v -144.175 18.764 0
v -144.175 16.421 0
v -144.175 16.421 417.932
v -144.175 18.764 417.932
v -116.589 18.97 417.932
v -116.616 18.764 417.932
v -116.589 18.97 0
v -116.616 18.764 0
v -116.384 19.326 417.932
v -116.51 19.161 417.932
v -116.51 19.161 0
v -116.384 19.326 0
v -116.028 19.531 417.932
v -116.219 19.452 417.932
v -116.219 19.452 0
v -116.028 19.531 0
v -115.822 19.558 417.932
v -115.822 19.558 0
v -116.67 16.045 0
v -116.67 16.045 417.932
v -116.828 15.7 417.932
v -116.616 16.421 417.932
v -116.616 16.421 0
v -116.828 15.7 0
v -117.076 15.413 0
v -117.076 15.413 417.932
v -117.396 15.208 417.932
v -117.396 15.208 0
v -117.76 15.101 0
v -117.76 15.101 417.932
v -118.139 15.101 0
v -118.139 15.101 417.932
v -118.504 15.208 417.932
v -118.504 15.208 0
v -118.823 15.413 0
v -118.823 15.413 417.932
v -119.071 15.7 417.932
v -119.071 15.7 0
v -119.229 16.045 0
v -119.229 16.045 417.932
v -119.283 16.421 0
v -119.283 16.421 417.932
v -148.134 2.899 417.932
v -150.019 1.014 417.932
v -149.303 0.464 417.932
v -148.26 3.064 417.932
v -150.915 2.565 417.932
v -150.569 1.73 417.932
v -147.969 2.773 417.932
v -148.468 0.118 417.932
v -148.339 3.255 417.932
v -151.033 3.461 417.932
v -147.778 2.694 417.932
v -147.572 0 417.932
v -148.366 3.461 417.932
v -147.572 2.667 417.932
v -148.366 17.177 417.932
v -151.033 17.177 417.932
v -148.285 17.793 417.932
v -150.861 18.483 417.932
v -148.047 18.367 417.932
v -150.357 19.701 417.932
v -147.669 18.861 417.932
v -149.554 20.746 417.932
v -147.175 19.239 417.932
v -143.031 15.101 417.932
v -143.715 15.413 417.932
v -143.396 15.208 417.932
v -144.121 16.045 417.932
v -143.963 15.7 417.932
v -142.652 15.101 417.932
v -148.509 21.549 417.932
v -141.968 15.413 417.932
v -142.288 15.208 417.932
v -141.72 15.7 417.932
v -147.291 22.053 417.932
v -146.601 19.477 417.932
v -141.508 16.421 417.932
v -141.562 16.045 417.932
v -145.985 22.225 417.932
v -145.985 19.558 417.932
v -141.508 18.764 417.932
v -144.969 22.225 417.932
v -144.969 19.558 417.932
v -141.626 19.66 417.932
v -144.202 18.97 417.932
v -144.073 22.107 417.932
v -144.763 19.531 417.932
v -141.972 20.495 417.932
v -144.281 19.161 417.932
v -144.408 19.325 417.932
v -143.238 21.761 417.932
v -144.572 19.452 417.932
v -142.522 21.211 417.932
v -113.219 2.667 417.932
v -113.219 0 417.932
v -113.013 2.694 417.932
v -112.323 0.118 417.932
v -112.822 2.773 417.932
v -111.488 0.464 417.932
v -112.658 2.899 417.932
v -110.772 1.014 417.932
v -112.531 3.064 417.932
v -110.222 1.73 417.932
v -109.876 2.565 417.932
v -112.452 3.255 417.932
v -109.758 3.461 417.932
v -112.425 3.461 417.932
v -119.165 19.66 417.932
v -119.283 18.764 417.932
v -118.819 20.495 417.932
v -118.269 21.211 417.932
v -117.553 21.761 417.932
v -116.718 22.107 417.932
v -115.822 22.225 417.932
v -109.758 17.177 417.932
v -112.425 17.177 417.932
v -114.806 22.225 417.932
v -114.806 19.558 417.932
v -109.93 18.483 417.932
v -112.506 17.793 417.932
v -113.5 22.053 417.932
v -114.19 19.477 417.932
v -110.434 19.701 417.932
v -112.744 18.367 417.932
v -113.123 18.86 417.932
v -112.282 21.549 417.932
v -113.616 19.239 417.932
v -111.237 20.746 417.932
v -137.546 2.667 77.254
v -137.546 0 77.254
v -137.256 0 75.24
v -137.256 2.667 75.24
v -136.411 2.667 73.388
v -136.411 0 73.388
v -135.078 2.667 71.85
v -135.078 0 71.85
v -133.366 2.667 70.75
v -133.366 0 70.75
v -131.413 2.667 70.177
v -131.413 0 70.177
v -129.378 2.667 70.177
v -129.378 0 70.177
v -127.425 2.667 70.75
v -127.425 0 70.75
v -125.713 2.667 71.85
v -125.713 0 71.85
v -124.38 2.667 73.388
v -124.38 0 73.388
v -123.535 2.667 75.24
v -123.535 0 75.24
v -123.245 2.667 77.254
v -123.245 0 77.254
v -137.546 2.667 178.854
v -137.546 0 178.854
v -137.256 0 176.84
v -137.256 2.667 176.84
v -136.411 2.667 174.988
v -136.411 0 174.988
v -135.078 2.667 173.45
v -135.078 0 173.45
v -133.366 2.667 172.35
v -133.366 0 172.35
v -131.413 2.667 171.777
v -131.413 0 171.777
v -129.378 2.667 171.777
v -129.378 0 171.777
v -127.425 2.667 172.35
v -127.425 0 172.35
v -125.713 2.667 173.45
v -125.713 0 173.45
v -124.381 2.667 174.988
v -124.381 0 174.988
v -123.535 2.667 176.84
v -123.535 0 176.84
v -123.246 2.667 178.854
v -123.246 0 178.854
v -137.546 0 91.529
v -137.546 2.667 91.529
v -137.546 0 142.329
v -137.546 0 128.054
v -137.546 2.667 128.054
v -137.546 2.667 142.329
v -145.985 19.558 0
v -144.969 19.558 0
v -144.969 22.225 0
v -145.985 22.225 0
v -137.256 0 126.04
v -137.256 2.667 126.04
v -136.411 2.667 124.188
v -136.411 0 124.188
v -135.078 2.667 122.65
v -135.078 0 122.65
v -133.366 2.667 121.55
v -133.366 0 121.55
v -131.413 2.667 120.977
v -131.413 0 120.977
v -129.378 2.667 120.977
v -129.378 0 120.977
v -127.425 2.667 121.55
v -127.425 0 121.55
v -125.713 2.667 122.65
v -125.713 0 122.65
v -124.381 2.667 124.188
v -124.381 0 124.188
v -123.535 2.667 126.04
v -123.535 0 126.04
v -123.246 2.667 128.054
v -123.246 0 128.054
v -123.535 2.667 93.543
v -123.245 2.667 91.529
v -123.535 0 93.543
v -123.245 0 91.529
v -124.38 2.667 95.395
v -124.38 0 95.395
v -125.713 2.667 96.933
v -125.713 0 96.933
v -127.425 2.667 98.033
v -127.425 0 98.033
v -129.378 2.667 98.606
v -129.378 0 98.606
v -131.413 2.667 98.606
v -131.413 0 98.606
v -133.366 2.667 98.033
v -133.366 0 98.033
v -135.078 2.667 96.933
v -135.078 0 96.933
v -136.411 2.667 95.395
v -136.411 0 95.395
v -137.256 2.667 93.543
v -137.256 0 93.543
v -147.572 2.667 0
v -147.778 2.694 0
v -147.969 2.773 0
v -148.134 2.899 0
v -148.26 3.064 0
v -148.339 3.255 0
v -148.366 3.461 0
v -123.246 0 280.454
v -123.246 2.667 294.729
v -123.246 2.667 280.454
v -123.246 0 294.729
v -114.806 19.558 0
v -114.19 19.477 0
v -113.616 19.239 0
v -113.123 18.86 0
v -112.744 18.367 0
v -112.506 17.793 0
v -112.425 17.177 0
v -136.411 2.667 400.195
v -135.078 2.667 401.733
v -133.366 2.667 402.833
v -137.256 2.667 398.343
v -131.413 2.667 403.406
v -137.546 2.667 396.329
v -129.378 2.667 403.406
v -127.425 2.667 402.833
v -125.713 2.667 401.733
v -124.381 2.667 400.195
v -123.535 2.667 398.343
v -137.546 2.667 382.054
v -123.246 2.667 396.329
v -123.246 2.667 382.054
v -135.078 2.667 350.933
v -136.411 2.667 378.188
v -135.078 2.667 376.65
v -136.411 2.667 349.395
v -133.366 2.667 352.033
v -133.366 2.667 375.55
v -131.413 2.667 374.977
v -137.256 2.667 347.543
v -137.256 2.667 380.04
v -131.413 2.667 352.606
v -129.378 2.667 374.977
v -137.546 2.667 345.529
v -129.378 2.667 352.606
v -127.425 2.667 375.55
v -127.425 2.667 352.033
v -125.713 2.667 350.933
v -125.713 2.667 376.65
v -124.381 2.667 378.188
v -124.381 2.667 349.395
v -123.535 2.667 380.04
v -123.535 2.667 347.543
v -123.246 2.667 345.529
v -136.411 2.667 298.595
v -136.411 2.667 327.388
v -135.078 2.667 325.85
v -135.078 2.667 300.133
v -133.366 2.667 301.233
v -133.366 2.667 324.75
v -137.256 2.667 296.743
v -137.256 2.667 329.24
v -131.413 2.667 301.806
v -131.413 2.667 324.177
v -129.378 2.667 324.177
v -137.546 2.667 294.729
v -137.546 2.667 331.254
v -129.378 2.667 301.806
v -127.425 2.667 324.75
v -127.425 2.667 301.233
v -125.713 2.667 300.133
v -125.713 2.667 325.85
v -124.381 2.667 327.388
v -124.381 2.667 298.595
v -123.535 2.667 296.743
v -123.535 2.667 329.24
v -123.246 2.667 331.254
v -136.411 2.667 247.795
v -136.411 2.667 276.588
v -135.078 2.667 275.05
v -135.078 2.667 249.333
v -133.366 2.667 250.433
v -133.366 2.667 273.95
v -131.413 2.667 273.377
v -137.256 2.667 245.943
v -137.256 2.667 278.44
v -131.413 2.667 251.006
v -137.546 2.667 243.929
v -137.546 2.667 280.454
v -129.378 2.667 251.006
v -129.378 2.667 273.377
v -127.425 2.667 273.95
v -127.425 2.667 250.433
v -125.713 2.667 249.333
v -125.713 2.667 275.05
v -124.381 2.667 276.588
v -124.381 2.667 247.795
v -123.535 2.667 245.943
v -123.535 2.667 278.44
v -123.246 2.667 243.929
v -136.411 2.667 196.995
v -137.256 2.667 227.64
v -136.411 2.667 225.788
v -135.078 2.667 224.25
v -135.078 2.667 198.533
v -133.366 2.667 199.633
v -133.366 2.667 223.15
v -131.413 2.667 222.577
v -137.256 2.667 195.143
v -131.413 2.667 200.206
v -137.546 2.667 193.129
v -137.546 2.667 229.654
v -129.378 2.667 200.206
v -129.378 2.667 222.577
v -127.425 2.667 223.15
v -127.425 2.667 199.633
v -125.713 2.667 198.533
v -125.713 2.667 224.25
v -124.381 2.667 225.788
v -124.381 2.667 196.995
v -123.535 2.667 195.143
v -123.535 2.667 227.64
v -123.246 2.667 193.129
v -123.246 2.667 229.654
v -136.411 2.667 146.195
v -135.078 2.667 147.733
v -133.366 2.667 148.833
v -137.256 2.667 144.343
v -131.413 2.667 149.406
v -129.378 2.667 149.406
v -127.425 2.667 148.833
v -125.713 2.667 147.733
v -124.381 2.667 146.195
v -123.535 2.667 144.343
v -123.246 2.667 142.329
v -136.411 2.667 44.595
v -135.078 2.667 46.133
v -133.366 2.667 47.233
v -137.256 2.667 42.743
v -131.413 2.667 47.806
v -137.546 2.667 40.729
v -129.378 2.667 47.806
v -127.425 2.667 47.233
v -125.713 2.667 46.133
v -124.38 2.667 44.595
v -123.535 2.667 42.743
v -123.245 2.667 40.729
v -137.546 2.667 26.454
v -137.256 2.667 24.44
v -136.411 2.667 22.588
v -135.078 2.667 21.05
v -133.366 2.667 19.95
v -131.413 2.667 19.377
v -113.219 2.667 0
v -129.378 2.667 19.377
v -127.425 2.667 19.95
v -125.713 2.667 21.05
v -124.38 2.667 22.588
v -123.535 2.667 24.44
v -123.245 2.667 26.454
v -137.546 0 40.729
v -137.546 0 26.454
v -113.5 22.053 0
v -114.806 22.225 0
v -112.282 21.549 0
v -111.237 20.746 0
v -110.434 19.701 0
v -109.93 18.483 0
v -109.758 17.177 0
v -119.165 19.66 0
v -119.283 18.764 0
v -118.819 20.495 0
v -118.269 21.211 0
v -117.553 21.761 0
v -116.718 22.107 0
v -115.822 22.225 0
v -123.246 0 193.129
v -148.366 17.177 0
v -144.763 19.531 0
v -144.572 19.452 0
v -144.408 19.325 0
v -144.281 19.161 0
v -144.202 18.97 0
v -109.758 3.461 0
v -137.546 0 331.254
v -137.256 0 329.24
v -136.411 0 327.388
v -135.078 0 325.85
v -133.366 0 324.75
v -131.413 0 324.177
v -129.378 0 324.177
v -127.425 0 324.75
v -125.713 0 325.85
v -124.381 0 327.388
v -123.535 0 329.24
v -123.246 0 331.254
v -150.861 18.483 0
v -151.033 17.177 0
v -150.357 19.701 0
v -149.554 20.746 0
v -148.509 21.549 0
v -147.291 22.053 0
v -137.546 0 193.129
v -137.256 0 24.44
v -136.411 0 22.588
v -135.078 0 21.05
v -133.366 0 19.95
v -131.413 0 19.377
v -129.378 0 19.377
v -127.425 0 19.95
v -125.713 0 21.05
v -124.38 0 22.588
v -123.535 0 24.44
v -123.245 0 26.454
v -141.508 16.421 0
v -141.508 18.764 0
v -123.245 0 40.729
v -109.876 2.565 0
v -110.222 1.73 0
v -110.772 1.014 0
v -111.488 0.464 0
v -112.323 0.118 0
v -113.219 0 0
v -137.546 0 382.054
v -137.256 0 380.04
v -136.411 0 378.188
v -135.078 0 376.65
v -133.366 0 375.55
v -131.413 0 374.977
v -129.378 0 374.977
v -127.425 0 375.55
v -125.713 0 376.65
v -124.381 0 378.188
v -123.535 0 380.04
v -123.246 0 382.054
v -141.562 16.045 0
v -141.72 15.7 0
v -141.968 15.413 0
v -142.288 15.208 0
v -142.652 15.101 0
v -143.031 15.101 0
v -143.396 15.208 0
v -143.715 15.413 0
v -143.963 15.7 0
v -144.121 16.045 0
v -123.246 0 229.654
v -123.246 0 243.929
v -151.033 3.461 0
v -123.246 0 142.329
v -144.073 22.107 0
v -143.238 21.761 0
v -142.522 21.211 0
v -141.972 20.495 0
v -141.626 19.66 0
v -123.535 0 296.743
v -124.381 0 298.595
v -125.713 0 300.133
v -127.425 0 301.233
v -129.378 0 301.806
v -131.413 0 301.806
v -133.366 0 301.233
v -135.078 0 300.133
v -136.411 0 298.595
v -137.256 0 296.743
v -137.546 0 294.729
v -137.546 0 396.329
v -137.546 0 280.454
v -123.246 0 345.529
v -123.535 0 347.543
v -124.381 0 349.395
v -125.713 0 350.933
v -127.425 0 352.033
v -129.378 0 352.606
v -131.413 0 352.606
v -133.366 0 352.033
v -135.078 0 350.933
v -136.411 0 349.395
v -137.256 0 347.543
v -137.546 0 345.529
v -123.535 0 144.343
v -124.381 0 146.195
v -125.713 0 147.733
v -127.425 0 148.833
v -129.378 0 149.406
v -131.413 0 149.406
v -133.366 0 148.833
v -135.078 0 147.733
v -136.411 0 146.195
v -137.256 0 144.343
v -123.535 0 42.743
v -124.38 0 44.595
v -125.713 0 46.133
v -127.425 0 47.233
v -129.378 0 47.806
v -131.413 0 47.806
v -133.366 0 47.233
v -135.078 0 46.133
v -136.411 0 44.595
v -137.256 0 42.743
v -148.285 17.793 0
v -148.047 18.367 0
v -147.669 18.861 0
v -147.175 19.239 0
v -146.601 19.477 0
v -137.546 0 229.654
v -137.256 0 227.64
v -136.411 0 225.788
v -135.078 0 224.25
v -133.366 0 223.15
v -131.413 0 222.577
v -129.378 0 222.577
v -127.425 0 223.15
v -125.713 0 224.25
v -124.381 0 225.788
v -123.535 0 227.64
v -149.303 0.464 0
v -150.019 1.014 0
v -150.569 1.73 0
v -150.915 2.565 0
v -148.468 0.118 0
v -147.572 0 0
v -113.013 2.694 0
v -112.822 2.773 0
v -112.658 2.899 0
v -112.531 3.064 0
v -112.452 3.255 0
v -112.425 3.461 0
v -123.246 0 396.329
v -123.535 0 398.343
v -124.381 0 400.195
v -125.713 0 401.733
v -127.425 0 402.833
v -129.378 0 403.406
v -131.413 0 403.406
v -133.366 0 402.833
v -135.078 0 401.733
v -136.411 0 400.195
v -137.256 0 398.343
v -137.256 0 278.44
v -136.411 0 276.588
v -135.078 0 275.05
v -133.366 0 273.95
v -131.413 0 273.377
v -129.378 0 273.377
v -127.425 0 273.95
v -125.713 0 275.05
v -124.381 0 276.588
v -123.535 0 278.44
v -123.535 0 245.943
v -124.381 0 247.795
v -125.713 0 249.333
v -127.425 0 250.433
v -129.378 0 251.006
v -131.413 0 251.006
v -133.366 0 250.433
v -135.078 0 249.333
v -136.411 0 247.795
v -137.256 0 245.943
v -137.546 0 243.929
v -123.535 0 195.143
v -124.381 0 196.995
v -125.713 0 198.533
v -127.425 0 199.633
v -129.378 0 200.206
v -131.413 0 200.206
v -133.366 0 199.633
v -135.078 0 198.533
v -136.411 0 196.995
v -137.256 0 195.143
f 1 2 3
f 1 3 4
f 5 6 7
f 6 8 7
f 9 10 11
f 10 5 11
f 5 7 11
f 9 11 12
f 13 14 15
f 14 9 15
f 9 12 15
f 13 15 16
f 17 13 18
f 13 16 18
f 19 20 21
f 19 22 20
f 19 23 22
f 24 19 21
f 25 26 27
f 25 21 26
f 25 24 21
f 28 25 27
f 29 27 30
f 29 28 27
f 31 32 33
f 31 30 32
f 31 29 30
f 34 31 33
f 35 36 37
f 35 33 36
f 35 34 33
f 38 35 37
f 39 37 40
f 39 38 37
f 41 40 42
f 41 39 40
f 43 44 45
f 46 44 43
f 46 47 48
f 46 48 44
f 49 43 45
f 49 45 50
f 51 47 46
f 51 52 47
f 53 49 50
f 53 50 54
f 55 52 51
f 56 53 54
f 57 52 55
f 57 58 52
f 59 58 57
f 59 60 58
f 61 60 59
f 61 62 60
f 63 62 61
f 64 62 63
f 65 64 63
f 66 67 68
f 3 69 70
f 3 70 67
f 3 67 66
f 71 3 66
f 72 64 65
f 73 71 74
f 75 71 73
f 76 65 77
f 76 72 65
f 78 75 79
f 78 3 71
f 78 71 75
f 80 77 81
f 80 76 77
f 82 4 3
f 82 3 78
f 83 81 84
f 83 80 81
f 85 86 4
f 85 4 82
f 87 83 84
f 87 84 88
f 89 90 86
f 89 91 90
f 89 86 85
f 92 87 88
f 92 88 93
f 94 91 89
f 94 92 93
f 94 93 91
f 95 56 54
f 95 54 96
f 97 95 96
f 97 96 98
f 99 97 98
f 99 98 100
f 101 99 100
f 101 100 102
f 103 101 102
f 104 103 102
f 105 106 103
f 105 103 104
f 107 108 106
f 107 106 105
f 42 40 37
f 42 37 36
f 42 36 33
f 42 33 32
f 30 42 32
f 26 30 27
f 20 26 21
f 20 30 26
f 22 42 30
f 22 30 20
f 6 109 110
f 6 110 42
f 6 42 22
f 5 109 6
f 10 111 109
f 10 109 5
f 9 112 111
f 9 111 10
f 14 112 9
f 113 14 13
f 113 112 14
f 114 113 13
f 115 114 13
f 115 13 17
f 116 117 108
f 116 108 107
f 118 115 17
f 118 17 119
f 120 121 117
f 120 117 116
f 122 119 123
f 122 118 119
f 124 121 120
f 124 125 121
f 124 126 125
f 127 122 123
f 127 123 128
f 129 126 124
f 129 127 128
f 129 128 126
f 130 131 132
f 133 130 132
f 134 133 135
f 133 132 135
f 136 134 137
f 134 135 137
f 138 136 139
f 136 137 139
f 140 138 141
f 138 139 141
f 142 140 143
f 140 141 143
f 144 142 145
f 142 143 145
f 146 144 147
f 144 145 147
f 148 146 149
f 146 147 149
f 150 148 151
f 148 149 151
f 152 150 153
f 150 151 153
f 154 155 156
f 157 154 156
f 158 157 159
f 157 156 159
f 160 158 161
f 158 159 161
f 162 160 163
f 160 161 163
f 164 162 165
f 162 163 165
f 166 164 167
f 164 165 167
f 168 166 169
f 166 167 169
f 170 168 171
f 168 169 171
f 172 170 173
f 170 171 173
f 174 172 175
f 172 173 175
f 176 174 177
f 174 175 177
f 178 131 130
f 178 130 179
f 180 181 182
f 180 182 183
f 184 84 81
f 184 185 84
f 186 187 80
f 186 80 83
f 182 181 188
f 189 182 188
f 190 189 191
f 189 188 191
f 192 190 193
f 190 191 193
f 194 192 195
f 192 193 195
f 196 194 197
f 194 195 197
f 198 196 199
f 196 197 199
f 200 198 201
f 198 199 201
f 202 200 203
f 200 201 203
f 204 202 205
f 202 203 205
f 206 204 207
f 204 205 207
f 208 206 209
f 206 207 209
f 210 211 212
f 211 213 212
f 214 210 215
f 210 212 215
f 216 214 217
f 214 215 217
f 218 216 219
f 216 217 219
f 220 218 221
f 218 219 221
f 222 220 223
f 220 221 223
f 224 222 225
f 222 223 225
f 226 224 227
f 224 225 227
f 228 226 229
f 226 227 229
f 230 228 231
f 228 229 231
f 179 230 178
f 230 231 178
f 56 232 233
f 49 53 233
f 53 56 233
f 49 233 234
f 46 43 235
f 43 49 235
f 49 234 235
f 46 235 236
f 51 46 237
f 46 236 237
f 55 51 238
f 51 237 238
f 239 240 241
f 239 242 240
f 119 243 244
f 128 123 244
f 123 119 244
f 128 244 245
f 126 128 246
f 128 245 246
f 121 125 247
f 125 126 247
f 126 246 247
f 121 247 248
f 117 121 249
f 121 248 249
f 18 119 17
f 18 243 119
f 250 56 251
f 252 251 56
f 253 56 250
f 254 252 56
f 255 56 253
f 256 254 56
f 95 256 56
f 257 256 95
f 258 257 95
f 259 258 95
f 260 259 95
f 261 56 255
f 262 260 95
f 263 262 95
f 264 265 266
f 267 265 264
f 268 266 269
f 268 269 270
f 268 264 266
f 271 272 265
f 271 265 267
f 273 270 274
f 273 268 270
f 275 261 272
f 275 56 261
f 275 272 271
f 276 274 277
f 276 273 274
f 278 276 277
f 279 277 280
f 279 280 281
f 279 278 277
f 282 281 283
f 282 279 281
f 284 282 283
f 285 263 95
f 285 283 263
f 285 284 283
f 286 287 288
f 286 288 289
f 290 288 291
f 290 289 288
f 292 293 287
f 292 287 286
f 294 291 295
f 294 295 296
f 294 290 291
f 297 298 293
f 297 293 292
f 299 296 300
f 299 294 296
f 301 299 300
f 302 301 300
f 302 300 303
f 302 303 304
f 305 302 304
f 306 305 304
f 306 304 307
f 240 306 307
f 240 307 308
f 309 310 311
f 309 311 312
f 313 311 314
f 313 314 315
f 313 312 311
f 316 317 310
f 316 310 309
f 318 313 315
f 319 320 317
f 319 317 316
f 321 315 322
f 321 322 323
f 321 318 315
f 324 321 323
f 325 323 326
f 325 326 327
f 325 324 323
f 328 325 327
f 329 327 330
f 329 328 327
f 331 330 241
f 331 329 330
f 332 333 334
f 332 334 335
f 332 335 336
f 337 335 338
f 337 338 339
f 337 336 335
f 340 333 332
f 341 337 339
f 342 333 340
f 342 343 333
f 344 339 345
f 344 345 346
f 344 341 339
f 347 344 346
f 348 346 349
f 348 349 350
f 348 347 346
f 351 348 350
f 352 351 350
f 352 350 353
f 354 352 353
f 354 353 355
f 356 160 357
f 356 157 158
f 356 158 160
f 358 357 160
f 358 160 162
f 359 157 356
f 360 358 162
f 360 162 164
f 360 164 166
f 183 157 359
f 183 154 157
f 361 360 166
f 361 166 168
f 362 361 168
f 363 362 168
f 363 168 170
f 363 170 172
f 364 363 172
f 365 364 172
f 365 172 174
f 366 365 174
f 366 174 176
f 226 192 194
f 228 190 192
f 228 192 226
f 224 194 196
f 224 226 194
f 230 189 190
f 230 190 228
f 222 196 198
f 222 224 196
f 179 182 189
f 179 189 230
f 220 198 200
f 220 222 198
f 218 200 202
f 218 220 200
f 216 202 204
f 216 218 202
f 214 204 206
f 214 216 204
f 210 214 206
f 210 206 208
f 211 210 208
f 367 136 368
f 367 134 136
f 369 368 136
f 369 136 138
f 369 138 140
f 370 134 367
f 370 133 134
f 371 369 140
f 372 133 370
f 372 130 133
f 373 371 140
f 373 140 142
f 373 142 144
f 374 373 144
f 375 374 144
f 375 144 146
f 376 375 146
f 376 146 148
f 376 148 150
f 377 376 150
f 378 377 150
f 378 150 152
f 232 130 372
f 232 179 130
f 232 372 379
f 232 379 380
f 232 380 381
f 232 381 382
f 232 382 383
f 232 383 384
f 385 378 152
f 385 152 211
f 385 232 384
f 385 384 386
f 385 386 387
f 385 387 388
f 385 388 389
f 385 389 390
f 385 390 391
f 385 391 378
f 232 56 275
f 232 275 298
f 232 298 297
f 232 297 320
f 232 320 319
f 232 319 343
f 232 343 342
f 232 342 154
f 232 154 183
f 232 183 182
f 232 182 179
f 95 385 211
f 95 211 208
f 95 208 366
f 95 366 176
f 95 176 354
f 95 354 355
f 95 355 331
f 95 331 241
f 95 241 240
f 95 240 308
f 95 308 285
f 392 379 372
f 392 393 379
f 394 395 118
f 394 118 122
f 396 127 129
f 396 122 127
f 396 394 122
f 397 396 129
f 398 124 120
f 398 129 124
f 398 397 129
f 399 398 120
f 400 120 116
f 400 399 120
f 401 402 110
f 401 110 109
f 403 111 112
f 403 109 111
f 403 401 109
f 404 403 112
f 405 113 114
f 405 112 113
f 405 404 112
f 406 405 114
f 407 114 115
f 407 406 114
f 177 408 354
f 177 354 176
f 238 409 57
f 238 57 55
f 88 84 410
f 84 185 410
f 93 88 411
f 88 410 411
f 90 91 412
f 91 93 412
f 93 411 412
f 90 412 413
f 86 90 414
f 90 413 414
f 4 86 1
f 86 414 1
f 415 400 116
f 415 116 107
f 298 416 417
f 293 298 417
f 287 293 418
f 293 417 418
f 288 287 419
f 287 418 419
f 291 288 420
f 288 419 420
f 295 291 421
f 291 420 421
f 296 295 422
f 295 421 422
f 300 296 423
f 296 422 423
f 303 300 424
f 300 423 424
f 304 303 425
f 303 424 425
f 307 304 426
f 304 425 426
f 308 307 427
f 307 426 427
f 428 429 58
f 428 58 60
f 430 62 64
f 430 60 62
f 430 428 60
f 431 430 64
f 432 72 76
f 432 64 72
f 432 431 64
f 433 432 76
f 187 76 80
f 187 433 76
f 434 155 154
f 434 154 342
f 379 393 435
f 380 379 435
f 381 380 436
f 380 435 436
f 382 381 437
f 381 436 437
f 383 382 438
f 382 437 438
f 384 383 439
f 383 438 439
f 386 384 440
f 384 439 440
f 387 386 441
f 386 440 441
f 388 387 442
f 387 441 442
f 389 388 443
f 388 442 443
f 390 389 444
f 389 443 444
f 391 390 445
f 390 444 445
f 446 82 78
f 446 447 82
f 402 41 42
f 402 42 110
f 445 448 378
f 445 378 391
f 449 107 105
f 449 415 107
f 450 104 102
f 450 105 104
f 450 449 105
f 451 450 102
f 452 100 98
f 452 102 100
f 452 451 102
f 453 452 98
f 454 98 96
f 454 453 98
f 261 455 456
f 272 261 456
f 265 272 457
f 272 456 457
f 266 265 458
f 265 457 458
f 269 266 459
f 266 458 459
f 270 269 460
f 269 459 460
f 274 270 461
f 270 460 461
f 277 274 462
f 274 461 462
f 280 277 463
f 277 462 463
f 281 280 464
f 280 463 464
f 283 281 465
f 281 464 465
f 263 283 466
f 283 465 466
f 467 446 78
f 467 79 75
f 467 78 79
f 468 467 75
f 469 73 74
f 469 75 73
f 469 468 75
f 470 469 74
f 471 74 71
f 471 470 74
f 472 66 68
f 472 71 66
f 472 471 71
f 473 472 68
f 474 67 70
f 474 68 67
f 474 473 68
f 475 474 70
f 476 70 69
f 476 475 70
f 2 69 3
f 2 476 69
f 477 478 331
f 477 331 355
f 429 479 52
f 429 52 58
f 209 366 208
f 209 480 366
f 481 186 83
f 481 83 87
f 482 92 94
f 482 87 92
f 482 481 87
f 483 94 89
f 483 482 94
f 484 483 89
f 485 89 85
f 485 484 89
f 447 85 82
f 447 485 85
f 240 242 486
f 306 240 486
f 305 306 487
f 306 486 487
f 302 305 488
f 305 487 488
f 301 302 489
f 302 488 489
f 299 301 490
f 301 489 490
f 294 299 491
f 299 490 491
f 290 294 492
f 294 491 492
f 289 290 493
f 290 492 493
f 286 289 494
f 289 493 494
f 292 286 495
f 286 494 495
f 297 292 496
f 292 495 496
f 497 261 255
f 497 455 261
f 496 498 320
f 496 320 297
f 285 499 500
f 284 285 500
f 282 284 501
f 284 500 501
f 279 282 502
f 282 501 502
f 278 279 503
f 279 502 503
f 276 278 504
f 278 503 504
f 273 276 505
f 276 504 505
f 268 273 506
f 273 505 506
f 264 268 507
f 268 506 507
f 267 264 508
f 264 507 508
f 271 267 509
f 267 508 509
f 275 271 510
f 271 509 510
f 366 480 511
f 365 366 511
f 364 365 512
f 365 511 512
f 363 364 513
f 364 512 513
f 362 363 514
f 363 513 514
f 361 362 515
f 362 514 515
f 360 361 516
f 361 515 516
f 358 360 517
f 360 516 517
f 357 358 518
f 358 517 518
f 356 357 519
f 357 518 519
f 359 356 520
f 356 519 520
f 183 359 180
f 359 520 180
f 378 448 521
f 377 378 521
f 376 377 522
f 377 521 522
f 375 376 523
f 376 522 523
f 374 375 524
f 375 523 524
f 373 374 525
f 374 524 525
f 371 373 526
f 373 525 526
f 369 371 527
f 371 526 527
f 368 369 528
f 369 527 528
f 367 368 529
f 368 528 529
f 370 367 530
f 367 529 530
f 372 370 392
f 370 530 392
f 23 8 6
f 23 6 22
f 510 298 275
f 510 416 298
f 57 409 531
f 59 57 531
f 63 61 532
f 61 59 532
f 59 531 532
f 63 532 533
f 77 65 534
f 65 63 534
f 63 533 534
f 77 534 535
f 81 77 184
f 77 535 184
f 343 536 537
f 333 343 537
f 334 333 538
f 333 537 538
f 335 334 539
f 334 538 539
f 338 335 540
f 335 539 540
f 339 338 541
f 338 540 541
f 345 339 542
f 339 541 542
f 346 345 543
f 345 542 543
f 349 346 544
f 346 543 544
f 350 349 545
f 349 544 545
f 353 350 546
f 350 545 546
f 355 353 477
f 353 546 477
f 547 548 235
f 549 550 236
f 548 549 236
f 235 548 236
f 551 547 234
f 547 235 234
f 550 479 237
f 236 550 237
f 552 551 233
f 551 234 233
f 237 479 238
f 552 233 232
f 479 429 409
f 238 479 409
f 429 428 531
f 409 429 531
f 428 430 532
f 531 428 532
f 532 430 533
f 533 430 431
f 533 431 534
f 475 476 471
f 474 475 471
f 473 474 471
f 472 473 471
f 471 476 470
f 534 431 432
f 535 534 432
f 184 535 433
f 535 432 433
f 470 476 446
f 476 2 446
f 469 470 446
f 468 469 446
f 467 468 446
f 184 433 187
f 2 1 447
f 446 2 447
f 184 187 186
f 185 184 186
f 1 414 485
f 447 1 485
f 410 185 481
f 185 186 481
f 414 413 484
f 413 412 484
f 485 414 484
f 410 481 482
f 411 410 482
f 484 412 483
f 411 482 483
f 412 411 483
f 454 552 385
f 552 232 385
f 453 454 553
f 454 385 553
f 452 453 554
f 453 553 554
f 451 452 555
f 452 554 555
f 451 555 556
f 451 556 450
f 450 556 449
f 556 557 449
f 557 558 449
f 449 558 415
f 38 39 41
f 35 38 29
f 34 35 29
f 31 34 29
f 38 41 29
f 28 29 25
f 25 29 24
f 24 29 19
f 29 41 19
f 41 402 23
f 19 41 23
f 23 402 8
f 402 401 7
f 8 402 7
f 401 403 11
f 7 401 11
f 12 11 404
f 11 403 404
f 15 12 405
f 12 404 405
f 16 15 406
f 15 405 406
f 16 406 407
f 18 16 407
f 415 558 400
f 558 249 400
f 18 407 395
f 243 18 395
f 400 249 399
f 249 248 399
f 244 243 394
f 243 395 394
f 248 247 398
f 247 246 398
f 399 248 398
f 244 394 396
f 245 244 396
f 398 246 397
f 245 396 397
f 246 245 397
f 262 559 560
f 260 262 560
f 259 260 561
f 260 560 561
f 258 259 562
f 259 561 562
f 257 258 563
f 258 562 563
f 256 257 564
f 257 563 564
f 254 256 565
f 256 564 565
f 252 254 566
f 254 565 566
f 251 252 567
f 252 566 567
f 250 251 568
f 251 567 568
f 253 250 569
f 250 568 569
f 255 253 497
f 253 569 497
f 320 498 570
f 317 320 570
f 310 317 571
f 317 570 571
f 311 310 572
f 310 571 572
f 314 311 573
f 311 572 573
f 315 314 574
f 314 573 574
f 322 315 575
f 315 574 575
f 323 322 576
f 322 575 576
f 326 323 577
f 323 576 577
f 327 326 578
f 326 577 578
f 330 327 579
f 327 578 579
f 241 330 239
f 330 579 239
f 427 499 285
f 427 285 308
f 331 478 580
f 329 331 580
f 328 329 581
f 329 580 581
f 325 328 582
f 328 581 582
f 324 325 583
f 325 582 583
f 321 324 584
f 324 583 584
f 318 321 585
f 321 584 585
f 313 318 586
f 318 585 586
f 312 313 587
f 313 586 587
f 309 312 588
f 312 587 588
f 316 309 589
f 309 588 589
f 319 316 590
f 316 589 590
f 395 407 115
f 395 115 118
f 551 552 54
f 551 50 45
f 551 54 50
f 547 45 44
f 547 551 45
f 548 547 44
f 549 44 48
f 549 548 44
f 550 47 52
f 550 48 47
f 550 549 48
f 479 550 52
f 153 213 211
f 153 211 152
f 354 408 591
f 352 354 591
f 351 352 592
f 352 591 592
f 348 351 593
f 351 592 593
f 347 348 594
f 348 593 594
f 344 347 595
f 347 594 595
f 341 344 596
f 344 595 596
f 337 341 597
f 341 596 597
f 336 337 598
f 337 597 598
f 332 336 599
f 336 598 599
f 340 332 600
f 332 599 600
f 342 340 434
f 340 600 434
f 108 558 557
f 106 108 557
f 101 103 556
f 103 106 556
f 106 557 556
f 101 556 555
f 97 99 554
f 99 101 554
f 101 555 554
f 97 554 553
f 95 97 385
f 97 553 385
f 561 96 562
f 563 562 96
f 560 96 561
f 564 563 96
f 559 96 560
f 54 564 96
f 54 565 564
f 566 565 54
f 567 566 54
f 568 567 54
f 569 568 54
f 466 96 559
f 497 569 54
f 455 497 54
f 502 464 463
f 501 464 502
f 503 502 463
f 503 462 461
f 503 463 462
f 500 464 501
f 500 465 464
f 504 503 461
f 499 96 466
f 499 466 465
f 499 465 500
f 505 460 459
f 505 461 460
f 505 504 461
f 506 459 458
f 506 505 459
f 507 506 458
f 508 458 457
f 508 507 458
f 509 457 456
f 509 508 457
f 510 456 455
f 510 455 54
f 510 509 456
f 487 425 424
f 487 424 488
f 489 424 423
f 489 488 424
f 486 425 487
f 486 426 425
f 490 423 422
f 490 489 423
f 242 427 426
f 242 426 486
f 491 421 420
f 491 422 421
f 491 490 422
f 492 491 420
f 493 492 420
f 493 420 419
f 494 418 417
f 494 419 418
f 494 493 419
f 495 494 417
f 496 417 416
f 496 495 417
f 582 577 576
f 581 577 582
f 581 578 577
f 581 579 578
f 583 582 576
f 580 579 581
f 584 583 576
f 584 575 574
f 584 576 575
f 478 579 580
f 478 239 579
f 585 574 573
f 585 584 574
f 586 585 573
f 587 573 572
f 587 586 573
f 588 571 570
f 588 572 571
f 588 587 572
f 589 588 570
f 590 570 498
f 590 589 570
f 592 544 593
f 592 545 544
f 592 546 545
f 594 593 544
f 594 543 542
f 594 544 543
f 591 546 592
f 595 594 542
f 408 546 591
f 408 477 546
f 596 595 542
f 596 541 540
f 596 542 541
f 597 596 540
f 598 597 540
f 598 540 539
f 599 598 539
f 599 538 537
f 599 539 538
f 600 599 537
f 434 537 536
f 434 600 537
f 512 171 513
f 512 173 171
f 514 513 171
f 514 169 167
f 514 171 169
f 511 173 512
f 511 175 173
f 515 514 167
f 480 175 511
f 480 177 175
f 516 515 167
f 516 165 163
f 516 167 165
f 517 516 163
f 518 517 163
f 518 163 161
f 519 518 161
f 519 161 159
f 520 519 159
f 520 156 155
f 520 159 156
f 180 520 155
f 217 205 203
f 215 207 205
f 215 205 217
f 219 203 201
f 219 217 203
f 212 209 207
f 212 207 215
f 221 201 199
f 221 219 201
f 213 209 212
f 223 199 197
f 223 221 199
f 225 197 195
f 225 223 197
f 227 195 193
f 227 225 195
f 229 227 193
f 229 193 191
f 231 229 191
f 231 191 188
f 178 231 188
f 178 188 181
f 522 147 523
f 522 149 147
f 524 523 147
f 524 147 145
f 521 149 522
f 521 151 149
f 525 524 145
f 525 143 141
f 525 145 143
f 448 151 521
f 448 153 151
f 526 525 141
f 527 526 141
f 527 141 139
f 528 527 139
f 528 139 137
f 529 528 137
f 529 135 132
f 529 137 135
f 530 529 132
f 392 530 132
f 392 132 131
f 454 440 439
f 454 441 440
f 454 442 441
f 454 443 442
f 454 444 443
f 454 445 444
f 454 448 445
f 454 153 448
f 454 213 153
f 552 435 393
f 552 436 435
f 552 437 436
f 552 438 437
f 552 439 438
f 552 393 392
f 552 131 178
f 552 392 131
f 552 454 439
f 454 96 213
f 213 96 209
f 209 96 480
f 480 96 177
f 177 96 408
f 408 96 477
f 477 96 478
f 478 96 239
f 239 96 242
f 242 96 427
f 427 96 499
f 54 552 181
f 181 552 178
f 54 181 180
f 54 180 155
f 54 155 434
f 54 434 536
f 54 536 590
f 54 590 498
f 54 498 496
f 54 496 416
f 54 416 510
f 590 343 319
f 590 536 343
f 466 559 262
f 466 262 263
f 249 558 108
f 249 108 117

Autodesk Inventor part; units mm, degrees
ref_plane "YZ Plane" through (0, 0, 0) normal (1, 0, 0) x (0, 1, 0)
ref_plane "XZ Plane" through (0, 0, 0) normal (0, 1, 0) x (-1, 0, 0)
ref_plane "Work Plane1" through (0, 0, 0) normal (0, 0, 1) x (1, 0, 0)
sketch "Sketch1" plane through (0, 0, 0) normal (0, 0, 1) x (1, 0, 0)
  arc A0 (-113.2188, 0) -> (-109.7581, 3.4607) centre (-113.2188, 3.4607) ccw projected
  line L0 (-109.7581, 17.1767) -> (-109.7581, 3.4607) projected
  arc A1 (-109.7581, 17.1767) -> (-114.8063, 22.225) centre (-114.8063, 17.1767) ccw projected
  line L1 (-115.8223, 22.225) -> (-114.8063, 22.225) projected
  arc A2 (-115.8223, 22.225) -> (-119.2831, 18.7642) centre (-115.8223, 18.7642) ccw projected
  line L2 (-119.2831, 16.4211) -> (-119.2831, 18.7642) projected
  arc A3 (-119.2831, 16.4211) -> (-116.6161, 16.4211) centre (-117.9496, 16.4211) ccw projected
  line L3 (-116.6161, 18.7642) -> (-116.6161, 16.4211) projected
  arc A4 (-115.8223, 19.558) -> (-116.6161, 18.7642) centre (-115.8223, 18.7642) ccw projected
  line L4 (-114.8063, 19.558) -> (-115.8223, 19.558) projected
  arc A5 (-112.4251, 17.1767) -> (-114.8063, 19.558) centre (-114.8063, 17.1767) ccw projected
  line L5 (-112.4251, 3.4607) -> (-112.4251, 17.1767) projected
  arc A6 (-113.2188, 2.667) -> (-112.4251, 3.4607) centre (-113.2188, 3.4607) ccw projected
  line L6 (-147.5723, 2.667) -> (-113.2188, 2.667) projected
  arc A7 (-148.3661, 3.4607) -> (-147.5723, 2.667) centre (-147.5723, 3.4607) ccw projected
  line L7 (-148.3661, 17.1767) -> (-148.3661, 3.4607) projected
  arc A8 (-145.9848, 19.558) -> (-148.3661, 17.1767) centre (-145.9848, 17.1767) ccw projected
  line L8 (-144.9688, 19.558) -> (-145.9848, 19.558) projected
  arc A9 (-144.1751, 18.7642) -> (-144.9688, 19.558) centre (-144.9688, 18.7642) ccw projected
  line L9 (-144.1751, 16.4211) -> (-144.1751, 18.7642) projected
  arc A10 (-144.1751, 16.4211) -> (-141.5081, 16.4211) centre (-142.8416, 16.4211) ccw projected
  line L10 (-141.5081, 18.7642) -> (-141.5081, 16.4211) projected
  arc A11 (-141.5081, 18.7642) -> (-144.9688, 22.225) centre (-144.9688, 18.7642) ccw projected
  line L11 (-145.9848, 22.225) -> (-144.9688, 22.225) projected
  arc A12 (-145.9848, 22.225) -> (-151.0331, 17.1767) centre (-145.9848, 17.1767) ccw projected
  line L12 (-151.0331, 3.4607) -> (-151.0331, 17.1767) projected
  arc A13 (-151.0331, 3.4607) -> (-147.5723, 0) centre (-147.5723, 3.4607) ccw projected
  line L13 (-113.2188, 0) -> (-147.5723, 0) projected
  point P0 (0, 0)
extrude "Extrusion1" add sketch "Sketch1" along normal blind 417.9316
ref_plane "Work Plane2" through (0, 0, 208.9658) normal (0, 0, 1) x (1, 0, 0)
sketch "Sketch2" plane through (-147.5723, 0, 0) normal (0, -1, 0) x (1, 0, 0)
  line L0 (17.1768, 26.4541) -> (17.1768, 40.7289) construction
  line L1 (6.0642, 0) -> (6.0642, 417.9316) projected
  line L2 (10.0267, 26.4541) -> (10.0267, 40.7289)
  line L3 (24.3269, 40.7289) -> (24.3269, 26.4541)
  arc A0 (10.0267, 26.4541) -> (24.3269, 26.4541) centre (17.1768, 26.4541) ccw
  arc A1 (24.3269, 40.7289) -> (10.0267, 40.7289) centre (17.1768, 40.7289) ccw
  line L4 (0, 0) -> (34.3535, 0) construction
  line L5 (17.1768, 0) -> (17.1767, 417.9316) construction
  line L6 (34.3535, 417.9316) -> (0, 417.9316) construction
  line L7 (10.0267, 77.2541) -> (10.0267, 91.5289)
  line L8 (24.3269, 91.5289) -> (24.3269, 77.2541)
  arc A2 (10.0267, 77.2541) -> (24.3269, 77.2541) centre (17.1768, 77.2541) ccw
  arc A3 (24.3269, 91.5289) -> (10.0267, 91.5289) centre (17.1768, 91.5289) ccw
  line L9 (17.1768, 50.8) -> (17.1767, 468.7316) construction
  line L10 (10.0266, 128.0541) -> (10.0266, 142.3289)
  line L11 (24.3268, 142.3289) -> (24.3268, 128.0541)
  arc A4 (10.0266, 128.0541) -> (24.3268, 128.0541) centre (17.1767, 128.0541) ccw
  arc A5 (24.3268, 142.3289) -> (10.0266, 142.3289) centre (17.1767, 142.3289) ccw
  line L12 (17.1768, 101.6) -> (17.1767, 519.5316) construction
  line L13 (10.0266, 178.8541) -> (10.0266, 193.1289)
  line L14 (24.3268, 193.1289) -> (24.3268, 178.8541)
  arc A6 (10.0266, 178.8541) -> (24.3268, 178.8541) centre (17.1767, 178.8541) ccw
  arc A7 (24.3268, 193.1289) -> (10.0266, 193.1289) centre (17.1767, 193.1289) ccw
  line L15 (17.1767, 152.4) -> (17.1767, 570.3316) construction
  line L16 (10.0266, 229.6541) -> (10.0266, 243.9289)
  line L17 (24.3268, 243.9289) -> (24.3268, 229.6541)
  arc A8 (10.0266, 229.6541) -> (24.3268, 229.6541) centre (17.1767, 229.6541) ccw
  arc A9 (24.3268, 243.9289) -> (10.0266, 243.9289) centre (17.1767, 243.9289) ccw
  line L18 (17.1767, 203.2) -> (17.1767, 621.1316) construction
  line L19 (10.0266, 280.4541) -> (10.0266, 294.7289)
  line L20 (24.3268, 294.7289) -> (24.3268, 280.4541)
  arc A10 (10.0266, 280.4541) -> (24.3268, 280.4541) centre (17.1767, 280.4541) ccw
  arc A11 (24.3268, 294.7289) -> (10.0266, 294.7289) centre (17.1767, 294.7289) ccw
  line L21 (17.1767, 254) -> (17.1767, 671.9316) construction
  line L22 (10.0266, 331.2541) -> (10.0266, 345.5289)
  line L23 (24.3268, 345.5289) -> (24.3268, 331.2541)
  arc A12 (10.0266, 331.2541) -> (24.3268, 331.2541) centre (17.1767, 331.2541) ccw
  arc A13 (24.3268, 345.5289) -> (10.0266, 345.5289) centre (17.1767, 345.5289) ccw
  line L24 (17.1767, 304.8) -> (17.1767, 722.7316) construction
  line L25 (10.0266, 382.0541) -> (10.0266, 396.3289)
  line L26 (24.3268, 396.3289) -> (24.3268, 382.0541)
  arc A14 (10.0266, 382.0541) -> (24.3268, 382.0541) centre (17.1767, 382.0541) ccw
  arc A15 (24.3268, 396.3289) -> (10.0266, 396.3289) centre (17.1767, 396.3289) ccw
  line L27 (17.1767, 355.6) -> (17.1767, 773.5316) construction
  point P0 (147.5723, 0)
  point P1 (17.1768, 33.5915)
  point P2 (17.1768, 84.3915)
  point P3 (17.1768, 135.1915)
  point P4 (17.1767, 185.9915)
  point P5 (17.1767, 236.7915)
  point P6 (17.1767, 287.5915)
  point P7 (17.1767, 338.3915)
  point P8 (17.1767, 389.1915)
  dimension "d2" = 14.3002
  dimension "d3" = 14.2748
  dimension "d4" = 26.4541
  dimension "d7" = 50.8
extrude "Extrusion2" cut sketch "Sketch2" against normal blind 25.4
properties part number "Horizontal-Unistrut-Tower-Connector-15"
